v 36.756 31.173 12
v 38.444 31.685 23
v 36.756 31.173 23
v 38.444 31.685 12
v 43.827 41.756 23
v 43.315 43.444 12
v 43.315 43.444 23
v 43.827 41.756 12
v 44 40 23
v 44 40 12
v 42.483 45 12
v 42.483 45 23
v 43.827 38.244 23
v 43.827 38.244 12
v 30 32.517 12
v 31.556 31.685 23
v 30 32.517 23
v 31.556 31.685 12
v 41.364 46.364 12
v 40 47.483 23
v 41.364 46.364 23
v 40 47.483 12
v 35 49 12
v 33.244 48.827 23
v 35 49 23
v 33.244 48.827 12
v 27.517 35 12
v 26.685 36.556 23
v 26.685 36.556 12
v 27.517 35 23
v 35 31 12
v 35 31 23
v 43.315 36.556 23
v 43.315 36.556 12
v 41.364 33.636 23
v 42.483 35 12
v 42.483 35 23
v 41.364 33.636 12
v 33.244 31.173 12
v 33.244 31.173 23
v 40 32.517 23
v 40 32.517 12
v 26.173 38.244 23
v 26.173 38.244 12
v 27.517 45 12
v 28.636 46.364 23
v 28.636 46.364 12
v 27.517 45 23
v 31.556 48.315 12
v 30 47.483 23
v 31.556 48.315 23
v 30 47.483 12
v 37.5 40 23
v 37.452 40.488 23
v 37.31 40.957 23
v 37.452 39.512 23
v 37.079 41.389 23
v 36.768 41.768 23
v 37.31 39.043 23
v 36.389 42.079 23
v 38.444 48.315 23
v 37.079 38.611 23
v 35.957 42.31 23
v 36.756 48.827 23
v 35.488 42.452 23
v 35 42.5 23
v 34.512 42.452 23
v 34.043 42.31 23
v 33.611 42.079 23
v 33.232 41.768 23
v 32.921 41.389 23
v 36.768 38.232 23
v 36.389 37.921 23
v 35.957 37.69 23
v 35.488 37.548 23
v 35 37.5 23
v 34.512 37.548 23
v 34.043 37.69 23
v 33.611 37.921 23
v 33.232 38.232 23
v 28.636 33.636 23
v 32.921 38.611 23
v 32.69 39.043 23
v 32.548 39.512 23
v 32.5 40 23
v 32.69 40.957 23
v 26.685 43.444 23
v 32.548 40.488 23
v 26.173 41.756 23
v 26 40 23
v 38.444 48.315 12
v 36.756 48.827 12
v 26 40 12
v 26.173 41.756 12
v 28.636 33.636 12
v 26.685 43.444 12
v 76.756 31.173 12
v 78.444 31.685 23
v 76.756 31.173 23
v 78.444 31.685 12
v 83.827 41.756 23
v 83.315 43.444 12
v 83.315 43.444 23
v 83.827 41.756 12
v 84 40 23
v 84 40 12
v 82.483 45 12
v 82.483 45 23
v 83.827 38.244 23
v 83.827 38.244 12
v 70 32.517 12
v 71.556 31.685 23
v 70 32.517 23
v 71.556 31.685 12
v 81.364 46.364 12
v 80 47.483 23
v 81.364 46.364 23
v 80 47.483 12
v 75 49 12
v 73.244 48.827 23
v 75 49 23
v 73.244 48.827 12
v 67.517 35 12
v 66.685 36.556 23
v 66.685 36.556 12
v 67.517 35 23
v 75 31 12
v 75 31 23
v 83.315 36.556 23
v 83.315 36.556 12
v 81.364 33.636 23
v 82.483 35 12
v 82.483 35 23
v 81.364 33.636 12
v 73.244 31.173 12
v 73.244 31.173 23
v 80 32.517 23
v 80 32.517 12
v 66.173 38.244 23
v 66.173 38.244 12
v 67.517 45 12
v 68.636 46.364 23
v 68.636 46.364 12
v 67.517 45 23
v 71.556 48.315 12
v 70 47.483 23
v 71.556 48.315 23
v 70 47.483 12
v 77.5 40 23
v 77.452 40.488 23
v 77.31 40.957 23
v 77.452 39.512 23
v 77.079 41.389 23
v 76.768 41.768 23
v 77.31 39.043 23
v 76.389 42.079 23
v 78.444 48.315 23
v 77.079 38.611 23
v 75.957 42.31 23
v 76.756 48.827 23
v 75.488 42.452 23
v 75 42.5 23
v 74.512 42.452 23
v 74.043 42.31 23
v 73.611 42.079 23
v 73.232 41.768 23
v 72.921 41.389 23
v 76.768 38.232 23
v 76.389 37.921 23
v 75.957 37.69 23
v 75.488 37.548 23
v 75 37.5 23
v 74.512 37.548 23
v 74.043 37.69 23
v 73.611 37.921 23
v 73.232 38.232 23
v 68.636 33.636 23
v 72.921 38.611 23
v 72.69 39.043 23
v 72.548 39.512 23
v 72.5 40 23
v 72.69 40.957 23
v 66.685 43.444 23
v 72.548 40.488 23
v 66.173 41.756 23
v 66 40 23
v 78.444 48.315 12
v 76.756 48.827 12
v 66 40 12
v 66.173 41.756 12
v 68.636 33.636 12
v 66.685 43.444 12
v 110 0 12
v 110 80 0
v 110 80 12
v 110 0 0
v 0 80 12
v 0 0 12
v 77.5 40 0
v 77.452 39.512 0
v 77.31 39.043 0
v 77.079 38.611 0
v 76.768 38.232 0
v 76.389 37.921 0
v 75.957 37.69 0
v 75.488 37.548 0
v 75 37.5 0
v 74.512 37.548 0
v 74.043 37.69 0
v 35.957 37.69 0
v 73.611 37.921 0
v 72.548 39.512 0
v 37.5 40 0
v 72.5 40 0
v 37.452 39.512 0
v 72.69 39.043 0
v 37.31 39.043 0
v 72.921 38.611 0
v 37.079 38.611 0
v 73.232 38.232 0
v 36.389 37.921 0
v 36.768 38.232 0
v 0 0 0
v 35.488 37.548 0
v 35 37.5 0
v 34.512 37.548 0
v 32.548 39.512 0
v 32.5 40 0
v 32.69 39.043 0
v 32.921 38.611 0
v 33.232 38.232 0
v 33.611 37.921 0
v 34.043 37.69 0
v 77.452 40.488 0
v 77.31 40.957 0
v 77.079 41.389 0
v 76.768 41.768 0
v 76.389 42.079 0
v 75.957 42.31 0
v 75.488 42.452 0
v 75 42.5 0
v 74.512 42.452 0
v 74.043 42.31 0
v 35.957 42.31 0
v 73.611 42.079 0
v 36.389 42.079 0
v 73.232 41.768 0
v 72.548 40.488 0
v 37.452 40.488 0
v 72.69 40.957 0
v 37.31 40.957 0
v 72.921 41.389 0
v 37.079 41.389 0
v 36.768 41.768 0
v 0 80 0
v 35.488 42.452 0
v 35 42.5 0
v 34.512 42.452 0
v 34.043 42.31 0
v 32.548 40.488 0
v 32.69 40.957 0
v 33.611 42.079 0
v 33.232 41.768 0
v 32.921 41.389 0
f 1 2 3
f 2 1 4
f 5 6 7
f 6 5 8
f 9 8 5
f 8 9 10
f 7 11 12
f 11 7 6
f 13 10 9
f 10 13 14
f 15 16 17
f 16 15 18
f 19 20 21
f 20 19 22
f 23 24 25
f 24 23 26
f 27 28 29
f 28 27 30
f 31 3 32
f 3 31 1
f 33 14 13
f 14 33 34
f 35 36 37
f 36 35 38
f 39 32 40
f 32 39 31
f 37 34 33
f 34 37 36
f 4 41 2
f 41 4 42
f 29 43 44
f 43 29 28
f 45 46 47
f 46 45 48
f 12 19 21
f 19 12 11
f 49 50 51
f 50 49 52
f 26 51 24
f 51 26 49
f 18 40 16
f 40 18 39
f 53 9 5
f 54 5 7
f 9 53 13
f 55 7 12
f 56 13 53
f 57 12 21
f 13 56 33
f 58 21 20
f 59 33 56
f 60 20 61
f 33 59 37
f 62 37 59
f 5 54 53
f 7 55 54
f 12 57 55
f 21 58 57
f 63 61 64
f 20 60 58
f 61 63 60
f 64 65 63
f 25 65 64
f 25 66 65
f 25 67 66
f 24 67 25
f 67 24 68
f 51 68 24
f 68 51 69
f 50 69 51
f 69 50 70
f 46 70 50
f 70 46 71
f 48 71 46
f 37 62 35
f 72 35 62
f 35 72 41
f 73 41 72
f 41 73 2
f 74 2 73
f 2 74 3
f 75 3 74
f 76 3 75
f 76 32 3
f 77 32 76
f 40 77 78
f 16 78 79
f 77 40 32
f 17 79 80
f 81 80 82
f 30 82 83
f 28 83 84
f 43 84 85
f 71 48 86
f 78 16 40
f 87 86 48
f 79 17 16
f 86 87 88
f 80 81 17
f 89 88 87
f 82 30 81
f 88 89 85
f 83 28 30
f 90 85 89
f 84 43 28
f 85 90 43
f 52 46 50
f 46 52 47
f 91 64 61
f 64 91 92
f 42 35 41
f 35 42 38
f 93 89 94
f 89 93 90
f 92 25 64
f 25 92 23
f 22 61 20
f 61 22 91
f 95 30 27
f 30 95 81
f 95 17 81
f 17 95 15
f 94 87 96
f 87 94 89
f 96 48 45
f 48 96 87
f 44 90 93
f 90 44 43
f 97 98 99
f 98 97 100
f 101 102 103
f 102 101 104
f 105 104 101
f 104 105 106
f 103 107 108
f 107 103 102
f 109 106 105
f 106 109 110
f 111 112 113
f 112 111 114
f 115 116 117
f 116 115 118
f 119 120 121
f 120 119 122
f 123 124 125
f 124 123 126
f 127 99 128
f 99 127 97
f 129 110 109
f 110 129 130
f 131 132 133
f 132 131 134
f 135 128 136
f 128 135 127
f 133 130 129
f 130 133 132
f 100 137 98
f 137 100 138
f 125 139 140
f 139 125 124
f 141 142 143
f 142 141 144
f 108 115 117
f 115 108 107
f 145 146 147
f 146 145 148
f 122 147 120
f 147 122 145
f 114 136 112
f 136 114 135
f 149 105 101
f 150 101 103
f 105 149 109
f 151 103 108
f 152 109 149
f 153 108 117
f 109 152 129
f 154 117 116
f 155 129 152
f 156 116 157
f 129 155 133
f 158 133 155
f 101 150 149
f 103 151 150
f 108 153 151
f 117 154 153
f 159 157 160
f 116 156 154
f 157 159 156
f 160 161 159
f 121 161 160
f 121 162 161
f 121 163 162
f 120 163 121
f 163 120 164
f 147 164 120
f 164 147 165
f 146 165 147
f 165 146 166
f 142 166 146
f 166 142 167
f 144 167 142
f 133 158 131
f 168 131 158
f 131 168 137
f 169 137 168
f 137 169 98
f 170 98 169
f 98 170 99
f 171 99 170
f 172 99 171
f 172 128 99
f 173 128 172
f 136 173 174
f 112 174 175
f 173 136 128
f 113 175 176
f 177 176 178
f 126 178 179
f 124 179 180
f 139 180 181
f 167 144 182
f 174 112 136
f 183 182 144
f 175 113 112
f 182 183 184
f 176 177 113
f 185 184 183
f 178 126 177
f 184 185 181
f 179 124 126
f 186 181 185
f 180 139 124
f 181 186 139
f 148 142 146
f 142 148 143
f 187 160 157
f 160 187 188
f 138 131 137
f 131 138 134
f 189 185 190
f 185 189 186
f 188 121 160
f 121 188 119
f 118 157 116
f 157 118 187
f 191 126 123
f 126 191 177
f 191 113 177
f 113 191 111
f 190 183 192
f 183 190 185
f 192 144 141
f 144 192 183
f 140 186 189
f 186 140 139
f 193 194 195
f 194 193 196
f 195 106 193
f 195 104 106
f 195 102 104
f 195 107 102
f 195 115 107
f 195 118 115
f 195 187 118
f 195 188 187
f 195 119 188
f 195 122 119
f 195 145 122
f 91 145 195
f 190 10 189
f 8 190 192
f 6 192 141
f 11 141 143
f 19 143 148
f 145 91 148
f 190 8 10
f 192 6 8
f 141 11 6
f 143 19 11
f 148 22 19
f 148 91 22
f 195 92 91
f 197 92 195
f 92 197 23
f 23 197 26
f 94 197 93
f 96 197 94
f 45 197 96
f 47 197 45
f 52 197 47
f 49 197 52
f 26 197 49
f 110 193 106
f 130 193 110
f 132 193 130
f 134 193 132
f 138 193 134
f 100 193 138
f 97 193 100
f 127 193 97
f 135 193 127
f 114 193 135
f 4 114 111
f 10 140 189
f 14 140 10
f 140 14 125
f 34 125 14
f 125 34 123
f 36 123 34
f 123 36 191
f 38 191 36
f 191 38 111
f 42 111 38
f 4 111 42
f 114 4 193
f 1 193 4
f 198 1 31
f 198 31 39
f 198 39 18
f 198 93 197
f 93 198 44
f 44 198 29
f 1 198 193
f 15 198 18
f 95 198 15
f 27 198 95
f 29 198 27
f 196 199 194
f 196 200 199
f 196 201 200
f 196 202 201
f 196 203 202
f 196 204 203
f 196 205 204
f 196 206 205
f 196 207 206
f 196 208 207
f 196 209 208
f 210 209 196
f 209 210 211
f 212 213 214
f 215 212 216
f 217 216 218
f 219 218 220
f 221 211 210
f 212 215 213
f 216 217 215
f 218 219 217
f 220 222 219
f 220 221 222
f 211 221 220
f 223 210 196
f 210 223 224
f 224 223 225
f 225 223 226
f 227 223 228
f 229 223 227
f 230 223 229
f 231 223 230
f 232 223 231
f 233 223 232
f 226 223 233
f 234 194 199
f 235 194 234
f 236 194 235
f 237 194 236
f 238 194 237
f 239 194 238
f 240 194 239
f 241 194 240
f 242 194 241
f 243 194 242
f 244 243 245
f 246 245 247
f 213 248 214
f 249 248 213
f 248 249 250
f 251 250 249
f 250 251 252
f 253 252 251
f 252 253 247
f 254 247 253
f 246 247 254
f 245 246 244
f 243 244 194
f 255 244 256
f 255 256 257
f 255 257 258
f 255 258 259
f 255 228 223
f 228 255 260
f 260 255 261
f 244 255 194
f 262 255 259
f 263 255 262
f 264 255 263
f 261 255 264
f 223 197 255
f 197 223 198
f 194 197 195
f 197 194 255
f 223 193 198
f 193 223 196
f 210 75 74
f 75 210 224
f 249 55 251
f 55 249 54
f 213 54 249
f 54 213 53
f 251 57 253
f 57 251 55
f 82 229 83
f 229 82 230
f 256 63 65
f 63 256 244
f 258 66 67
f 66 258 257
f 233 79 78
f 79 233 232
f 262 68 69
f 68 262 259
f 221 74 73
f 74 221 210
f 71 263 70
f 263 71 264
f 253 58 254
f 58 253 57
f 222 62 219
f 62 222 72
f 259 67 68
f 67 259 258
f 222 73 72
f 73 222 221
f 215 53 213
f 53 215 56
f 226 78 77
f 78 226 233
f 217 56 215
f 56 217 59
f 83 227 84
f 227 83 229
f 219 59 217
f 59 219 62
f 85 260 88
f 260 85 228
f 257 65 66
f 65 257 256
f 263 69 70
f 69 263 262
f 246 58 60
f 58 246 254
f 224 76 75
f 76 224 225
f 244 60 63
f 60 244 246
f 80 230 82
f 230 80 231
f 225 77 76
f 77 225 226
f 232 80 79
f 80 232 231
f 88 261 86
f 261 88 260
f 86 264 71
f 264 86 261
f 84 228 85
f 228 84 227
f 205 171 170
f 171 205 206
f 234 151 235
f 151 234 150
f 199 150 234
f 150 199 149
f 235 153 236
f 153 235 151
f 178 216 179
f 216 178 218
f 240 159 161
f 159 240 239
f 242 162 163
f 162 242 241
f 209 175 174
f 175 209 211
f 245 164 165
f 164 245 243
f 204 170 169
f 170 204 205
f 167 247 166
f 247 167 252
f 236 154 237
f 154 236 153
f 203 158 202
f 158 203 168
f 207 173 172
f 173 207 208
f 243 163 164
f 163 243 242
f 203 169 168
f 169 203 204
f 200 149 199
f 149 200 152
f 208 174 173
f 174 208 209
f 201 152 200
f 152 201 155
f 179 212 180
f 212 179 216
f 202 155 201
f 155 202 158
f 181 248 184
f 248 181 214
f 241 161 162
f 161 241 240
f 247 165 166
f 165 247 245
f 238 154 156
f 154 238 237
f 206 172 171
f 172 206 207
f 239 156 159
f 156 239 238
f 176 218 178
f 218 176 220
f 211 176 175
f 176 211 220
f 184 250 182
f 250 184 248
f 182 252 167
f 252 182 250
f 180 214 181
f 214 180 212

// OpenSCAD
$fn = 32;

// ----------------------------------------------------------------------
// Drill jig: two_boss jig
// ----------------------------------------------------------------------

// --- parameters (mm) ---
plate_l = 110;            // plate length, X
plate_w = 80;             // plate width, Y
plate_t = 12;             // plate thickness
boss_d = 18;              // guide boss diameter
boss_h = 12;              // boss height above the plate
guide_d = 5;              // guide hole diameter
boss_pitch = 40;          // boss pitch

n_boss = 2;  // guide bosses
boss_x0 = (plate_l - (n_boss - 1) * boss_pitch) / 2;  // first boss X
boss_top = plate_t - 1 + boss_h;  // boss crown height
total_h = boss_top;  // overall height

difference() {
  union() {
  cube([plate_l, plate_w, plate_t]);
  for (i = [0 : n_boss - 1])
    translate([boss_x0 + i * boss_pitch, plate_w / 2, plate_t - 1])
      cylinder(h = boss_h, d = boss_d);
  }
  for (i = [0 : n_boss - 1])
    translate([boss_x0 + i * boss_pitch, plate_w / 2, -1])
      cylinder(h = plate_t + boss_h, d = guide_d);
}
